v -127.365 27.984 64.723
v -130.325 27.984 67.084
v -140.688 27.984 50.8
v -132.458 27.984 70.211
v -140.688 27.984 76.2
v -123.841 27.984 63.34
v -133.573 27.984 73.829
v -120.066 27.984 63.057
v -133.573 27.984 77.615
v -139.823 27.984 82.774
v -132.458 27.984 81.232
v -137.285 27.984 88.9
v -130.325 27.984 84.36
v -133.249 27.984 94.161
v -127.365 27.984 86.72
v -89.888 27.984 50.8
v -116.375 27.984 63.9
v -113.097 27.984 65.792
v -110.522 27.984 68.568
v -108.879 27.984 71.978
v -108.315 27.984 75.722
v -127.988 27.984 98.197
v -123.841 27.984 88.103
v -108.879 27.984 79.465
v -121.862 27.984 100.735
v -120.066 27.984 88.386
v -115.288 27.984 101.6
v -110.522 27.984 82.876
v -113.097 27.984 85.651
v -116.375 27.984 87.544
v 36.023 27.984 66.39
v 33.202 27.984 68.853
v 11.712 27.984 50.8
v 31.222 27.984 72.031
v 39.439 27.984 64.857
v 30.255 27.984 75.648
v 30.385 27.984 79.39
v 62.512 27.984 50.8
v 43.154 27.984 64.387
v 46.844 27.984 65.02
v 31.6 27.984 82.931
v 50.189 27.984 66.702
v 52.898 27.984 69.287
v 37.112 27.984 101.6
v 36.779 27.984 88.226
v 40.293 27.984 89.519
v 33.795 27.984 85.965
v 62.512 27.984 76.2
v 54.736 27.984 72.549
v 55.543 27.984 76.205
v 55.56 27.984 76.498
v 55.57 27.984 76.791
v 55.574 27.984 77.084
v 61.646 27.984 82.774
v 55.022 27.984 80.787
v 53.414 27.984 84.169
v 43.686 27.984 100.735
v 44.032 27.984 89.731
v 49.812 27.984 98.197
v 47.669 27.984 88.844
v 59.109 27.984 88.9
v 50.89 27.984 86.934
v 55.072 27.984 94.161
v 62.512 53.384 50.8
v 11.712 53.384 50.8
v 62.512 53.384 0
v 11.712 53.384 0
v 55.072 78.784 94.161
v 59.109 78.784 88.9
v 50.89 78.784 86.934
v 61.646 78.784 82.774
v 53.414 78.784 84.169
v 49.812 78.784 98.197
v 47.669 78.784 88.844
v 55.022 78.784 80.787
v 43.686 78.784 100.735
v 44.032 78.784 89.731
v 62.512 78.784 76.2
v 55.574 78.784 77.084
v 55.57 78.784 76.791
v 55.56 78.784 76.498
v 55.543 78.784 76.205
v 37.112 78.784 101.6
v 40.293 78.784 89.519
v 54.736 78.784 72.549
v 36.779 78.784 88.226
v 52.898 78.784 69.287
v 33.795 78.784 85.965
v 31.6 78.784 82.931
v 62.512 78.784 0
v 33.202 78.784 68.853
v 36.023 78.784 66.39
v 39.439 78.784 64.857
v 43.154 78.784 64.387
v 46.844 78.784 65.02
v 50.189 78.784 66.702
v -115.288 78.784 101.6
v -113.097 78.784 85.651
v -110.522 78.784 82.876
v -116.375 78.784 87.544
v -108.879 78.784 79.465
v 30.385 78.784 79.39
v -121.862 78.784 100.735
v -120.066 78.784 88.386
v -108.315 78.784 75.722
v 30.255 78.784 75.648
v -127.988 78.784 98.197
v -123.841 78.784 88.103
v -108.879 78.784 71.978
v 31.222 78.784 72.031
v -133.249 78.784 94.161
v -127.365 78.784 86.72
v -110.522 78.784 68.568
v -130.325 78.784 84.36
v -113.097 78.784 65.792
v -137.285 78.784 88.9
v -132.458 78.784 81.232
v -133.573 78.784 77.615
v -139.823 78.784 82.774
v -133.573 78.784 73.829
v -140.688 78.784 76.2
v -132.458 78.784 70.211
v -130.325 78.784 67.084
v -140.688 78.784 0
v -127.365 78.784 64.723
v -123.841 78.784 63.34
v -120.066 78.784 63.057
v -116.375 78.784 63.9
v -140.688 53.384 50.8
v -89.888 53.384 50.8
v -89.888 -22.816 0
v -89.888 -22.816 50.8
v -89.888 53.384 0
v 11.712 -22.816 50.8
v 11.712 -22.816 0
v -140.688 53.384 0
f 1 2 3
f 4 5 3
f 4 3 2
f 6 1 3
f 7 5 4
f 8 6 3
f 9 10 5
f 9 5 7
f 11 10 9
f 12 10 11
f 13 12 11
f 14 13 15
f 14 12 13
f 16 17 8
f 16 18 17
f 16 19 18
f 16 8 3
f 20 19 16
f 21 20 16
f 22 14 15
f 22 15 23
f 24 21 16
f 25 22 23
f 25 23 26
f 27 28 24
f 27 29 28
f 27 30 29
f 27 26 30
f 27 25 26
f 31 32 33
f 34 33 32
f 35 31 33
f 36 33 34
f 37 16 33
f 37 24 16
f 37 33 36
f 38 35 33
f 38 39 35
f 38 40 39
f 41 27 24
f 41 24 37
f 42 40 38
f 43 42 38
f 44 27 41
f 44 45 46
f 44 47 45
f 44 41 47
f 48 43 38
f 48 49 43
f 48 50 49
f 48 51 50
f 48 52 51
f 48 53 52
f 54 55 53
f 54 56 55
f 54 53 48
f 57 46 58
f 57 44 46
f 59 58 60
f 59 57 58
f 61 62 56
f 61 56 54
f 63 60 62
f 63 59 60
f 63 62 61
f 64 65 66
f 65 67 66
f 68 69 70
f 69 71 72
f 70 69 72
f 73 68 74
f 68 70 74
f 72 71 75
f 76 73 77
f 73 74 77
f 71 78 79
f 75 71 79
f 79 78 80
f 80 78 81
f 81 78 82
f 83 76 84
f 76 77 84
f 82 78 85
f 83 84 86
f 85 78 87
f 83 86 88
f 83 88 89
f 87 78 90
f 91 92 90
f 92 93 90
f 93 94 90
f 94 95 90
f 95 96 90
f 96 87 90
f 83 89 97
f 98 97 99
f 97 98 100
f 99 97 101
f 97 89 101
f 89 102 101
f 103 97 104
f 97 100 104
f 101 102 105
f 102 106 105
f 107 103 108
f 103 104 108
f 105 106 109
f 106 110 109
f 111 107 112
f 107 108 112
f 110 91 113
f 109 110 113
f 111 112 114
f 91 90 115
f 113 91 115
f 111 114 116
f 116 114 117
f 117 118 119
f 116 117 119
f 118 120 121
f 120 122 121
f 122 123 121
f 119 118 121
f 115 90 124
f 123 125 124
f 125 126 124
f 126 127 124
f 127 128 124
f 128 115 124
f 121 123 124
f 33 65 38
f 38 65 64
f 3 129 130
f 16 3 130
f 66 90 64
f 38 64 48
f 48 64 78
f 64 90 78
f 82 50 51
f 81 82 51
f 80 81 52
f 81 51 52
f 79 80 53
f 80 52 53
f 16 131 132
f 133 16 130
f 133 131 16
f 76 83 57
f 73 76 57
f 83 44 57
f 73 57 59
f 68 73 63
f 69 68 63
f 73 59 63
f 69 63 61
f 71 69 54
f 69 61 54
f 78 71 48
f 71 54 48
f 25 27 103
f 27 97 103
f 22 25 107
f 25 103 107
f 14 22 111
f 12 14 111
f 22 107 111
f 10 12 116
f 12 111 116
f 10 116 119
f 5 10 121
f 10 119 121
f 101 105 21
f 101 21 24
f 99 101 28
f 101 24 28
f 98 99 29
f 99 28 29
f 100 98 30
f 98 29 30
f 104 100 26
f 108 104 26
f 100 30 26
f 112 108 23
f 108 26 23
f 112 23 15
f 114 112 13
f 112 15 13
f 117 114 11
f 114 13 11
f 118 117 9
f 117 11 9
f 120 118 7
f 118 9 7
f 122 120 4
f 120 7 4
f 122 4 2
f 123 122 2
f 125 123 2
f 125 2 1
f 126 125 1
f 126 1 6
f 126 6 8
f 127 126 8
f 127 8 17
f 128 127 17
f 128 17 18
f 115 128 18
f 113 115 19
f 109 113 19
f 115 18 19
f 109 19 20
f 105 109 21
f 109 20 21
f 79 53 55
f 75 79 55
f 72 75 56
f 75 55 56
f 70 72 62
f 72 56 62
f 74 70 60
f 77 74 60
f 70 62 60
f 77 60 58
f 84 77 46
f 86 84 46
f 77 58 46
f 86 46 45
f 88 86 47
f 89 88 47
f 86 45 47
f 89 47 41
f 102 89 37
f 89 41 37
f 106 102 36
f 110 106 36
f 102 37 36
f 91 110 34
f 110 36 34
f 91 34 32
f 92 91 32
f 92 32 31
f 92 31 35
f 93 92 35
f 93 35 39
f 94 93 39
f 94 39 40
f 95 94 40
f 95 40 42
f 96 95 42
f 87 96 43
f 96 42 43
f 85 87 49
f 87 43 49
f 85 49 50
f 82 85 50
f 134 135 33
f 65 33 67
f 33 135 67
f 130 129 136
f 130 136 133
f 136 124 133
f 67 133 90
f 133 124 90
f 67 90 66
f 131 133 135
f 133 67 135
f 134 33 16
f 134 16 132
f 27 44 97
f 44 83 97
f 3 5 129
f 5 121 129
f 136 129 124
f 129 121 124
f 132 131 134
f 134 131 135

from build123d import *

# Parameters (mm, degrees)
F0_W      = 101.6
F0_H      = 101.6
F1_DEPTH  = 50.8
F2_W      = 25.4
F2_H      = 50.8
F3_DEPTH  = 50.8
F4_W      = 25.4
F4_H      = 50.8
F5_DEPTH  = 50.8
F7_DEPTH  = 25.4
F8_DEPTH  = 25.4
F10_DEPTH = 25.4
F11_R     = 12.7
F12_DEPTH = 50.8
F14_DEPTH = 50.8
F15_R     = 25.4
F16_R     = 25.4


with BuildPart() as f1:
    # F0 (on Top) → F1 (new body)
    with BuildSketch(Plane.XY):
        with Locations((-39.0884162307, 27.9844595671)):
            Rectangle(F0_W, F0_H)
    extrude(amount=F1_DEPTH)

    # F2 (on face) → F3 (join)
    with BuildSketch(Plane.YZ.offset(11.7115837693)):
        with Locations((66.0844595671, 25.4)):
            Rectangle(F2_W, F2_H)
    extrude(amount=F3_DEPTH)

    # F4 (on face) → F5 (join)
    with BuildSketch(Plane(origin=(-89.8884162307, 0, 0), x_dir=(0, -1, 0), z_dir=(-1, 0, 0))):
        with Locations((-66.0844595671, 25.4)):
            Rectangle(F4_W, F4_H)
    extrude(amount=F5_DEPTH)

    # F6 (on face) → F7 (join)
    with BuildSketch(Plane.XY.offset(50.8)):
        Polygon((-140.6884162307, 53.3844595671), (-89.8884162307, 53.3844595671), (11.7115837693, 53.3844595671), (62.5115837693, 53.3844595671), (62.5115837693, 78.7844595671), (-140.6884162307, 78.7844595671), align=None)
    extrude(amount=F7_DEPTH)

    # F8 (add): a face of the model
    f8_faces = [f1.faces().sort_by_distance(p)[0] for p in [
        (-39.0884162307, 66.0844595671, 76.2),
    ]]
    extrude(f8_faces, amount=F8_DEPTH)

    # F9 (on face) → F10 (join)
    with BuildSketch(Plane.XZ.offset(-53.3844595671)):
        Polygon((-140.6884162307, 50.8), (-89.8884162307, 50.8), (11.7115837693, 50.8), (62.5115837693, 50.8), (62.5115837693, 101.6), (-140.6884162307, 101.6), align=None)
    extrude(amount=F10_DEPTH)

    # F11 (on face) → F12 (cut)
    with BuildSketch(Plane.XZ.offset(-27.9844595671)):
        with Locations((-121.0152357817, 75.7217407227)):
            Circle(F11_R)
    extrude(amount=-F12_DEPTH, mode=Mode.SUBTRACT)

    # F13 (on face) → F14 (cut)
    with BuildSketch(Plane.XZ.offset(-27.9844595671)):
        with BuildLine():
            ThreePointArc((55.5737721028, 77.0839367255), (30.1813854063, 77.523618368), (55.5433280167, 76.2051005946))
            ThreePointArc((55.5433280167, 76.2051005946), (55.5661587993, 76.6442550829), (55.5737721028, 77.0839367255))
        make_face()
    extrude(amount=-F14_DEPTH, mode=Mode.SUBTRACT)

    # F15
    f15_edges = [f1.edges().sort_by_distance(p)[0] for p in [
        (62.511584, 53.38446, 101.6),
    ]]
    fillet(f15_edges, radius=F15_R)

    # F16
    f16_edges = [f1.edges().sort_by_distance(p)[0] for p in [
        (-140.688416, 53.38446, 101.6),
    ]]
    fillet(f16_edges, radius=F16_R)


solid = f1.part
